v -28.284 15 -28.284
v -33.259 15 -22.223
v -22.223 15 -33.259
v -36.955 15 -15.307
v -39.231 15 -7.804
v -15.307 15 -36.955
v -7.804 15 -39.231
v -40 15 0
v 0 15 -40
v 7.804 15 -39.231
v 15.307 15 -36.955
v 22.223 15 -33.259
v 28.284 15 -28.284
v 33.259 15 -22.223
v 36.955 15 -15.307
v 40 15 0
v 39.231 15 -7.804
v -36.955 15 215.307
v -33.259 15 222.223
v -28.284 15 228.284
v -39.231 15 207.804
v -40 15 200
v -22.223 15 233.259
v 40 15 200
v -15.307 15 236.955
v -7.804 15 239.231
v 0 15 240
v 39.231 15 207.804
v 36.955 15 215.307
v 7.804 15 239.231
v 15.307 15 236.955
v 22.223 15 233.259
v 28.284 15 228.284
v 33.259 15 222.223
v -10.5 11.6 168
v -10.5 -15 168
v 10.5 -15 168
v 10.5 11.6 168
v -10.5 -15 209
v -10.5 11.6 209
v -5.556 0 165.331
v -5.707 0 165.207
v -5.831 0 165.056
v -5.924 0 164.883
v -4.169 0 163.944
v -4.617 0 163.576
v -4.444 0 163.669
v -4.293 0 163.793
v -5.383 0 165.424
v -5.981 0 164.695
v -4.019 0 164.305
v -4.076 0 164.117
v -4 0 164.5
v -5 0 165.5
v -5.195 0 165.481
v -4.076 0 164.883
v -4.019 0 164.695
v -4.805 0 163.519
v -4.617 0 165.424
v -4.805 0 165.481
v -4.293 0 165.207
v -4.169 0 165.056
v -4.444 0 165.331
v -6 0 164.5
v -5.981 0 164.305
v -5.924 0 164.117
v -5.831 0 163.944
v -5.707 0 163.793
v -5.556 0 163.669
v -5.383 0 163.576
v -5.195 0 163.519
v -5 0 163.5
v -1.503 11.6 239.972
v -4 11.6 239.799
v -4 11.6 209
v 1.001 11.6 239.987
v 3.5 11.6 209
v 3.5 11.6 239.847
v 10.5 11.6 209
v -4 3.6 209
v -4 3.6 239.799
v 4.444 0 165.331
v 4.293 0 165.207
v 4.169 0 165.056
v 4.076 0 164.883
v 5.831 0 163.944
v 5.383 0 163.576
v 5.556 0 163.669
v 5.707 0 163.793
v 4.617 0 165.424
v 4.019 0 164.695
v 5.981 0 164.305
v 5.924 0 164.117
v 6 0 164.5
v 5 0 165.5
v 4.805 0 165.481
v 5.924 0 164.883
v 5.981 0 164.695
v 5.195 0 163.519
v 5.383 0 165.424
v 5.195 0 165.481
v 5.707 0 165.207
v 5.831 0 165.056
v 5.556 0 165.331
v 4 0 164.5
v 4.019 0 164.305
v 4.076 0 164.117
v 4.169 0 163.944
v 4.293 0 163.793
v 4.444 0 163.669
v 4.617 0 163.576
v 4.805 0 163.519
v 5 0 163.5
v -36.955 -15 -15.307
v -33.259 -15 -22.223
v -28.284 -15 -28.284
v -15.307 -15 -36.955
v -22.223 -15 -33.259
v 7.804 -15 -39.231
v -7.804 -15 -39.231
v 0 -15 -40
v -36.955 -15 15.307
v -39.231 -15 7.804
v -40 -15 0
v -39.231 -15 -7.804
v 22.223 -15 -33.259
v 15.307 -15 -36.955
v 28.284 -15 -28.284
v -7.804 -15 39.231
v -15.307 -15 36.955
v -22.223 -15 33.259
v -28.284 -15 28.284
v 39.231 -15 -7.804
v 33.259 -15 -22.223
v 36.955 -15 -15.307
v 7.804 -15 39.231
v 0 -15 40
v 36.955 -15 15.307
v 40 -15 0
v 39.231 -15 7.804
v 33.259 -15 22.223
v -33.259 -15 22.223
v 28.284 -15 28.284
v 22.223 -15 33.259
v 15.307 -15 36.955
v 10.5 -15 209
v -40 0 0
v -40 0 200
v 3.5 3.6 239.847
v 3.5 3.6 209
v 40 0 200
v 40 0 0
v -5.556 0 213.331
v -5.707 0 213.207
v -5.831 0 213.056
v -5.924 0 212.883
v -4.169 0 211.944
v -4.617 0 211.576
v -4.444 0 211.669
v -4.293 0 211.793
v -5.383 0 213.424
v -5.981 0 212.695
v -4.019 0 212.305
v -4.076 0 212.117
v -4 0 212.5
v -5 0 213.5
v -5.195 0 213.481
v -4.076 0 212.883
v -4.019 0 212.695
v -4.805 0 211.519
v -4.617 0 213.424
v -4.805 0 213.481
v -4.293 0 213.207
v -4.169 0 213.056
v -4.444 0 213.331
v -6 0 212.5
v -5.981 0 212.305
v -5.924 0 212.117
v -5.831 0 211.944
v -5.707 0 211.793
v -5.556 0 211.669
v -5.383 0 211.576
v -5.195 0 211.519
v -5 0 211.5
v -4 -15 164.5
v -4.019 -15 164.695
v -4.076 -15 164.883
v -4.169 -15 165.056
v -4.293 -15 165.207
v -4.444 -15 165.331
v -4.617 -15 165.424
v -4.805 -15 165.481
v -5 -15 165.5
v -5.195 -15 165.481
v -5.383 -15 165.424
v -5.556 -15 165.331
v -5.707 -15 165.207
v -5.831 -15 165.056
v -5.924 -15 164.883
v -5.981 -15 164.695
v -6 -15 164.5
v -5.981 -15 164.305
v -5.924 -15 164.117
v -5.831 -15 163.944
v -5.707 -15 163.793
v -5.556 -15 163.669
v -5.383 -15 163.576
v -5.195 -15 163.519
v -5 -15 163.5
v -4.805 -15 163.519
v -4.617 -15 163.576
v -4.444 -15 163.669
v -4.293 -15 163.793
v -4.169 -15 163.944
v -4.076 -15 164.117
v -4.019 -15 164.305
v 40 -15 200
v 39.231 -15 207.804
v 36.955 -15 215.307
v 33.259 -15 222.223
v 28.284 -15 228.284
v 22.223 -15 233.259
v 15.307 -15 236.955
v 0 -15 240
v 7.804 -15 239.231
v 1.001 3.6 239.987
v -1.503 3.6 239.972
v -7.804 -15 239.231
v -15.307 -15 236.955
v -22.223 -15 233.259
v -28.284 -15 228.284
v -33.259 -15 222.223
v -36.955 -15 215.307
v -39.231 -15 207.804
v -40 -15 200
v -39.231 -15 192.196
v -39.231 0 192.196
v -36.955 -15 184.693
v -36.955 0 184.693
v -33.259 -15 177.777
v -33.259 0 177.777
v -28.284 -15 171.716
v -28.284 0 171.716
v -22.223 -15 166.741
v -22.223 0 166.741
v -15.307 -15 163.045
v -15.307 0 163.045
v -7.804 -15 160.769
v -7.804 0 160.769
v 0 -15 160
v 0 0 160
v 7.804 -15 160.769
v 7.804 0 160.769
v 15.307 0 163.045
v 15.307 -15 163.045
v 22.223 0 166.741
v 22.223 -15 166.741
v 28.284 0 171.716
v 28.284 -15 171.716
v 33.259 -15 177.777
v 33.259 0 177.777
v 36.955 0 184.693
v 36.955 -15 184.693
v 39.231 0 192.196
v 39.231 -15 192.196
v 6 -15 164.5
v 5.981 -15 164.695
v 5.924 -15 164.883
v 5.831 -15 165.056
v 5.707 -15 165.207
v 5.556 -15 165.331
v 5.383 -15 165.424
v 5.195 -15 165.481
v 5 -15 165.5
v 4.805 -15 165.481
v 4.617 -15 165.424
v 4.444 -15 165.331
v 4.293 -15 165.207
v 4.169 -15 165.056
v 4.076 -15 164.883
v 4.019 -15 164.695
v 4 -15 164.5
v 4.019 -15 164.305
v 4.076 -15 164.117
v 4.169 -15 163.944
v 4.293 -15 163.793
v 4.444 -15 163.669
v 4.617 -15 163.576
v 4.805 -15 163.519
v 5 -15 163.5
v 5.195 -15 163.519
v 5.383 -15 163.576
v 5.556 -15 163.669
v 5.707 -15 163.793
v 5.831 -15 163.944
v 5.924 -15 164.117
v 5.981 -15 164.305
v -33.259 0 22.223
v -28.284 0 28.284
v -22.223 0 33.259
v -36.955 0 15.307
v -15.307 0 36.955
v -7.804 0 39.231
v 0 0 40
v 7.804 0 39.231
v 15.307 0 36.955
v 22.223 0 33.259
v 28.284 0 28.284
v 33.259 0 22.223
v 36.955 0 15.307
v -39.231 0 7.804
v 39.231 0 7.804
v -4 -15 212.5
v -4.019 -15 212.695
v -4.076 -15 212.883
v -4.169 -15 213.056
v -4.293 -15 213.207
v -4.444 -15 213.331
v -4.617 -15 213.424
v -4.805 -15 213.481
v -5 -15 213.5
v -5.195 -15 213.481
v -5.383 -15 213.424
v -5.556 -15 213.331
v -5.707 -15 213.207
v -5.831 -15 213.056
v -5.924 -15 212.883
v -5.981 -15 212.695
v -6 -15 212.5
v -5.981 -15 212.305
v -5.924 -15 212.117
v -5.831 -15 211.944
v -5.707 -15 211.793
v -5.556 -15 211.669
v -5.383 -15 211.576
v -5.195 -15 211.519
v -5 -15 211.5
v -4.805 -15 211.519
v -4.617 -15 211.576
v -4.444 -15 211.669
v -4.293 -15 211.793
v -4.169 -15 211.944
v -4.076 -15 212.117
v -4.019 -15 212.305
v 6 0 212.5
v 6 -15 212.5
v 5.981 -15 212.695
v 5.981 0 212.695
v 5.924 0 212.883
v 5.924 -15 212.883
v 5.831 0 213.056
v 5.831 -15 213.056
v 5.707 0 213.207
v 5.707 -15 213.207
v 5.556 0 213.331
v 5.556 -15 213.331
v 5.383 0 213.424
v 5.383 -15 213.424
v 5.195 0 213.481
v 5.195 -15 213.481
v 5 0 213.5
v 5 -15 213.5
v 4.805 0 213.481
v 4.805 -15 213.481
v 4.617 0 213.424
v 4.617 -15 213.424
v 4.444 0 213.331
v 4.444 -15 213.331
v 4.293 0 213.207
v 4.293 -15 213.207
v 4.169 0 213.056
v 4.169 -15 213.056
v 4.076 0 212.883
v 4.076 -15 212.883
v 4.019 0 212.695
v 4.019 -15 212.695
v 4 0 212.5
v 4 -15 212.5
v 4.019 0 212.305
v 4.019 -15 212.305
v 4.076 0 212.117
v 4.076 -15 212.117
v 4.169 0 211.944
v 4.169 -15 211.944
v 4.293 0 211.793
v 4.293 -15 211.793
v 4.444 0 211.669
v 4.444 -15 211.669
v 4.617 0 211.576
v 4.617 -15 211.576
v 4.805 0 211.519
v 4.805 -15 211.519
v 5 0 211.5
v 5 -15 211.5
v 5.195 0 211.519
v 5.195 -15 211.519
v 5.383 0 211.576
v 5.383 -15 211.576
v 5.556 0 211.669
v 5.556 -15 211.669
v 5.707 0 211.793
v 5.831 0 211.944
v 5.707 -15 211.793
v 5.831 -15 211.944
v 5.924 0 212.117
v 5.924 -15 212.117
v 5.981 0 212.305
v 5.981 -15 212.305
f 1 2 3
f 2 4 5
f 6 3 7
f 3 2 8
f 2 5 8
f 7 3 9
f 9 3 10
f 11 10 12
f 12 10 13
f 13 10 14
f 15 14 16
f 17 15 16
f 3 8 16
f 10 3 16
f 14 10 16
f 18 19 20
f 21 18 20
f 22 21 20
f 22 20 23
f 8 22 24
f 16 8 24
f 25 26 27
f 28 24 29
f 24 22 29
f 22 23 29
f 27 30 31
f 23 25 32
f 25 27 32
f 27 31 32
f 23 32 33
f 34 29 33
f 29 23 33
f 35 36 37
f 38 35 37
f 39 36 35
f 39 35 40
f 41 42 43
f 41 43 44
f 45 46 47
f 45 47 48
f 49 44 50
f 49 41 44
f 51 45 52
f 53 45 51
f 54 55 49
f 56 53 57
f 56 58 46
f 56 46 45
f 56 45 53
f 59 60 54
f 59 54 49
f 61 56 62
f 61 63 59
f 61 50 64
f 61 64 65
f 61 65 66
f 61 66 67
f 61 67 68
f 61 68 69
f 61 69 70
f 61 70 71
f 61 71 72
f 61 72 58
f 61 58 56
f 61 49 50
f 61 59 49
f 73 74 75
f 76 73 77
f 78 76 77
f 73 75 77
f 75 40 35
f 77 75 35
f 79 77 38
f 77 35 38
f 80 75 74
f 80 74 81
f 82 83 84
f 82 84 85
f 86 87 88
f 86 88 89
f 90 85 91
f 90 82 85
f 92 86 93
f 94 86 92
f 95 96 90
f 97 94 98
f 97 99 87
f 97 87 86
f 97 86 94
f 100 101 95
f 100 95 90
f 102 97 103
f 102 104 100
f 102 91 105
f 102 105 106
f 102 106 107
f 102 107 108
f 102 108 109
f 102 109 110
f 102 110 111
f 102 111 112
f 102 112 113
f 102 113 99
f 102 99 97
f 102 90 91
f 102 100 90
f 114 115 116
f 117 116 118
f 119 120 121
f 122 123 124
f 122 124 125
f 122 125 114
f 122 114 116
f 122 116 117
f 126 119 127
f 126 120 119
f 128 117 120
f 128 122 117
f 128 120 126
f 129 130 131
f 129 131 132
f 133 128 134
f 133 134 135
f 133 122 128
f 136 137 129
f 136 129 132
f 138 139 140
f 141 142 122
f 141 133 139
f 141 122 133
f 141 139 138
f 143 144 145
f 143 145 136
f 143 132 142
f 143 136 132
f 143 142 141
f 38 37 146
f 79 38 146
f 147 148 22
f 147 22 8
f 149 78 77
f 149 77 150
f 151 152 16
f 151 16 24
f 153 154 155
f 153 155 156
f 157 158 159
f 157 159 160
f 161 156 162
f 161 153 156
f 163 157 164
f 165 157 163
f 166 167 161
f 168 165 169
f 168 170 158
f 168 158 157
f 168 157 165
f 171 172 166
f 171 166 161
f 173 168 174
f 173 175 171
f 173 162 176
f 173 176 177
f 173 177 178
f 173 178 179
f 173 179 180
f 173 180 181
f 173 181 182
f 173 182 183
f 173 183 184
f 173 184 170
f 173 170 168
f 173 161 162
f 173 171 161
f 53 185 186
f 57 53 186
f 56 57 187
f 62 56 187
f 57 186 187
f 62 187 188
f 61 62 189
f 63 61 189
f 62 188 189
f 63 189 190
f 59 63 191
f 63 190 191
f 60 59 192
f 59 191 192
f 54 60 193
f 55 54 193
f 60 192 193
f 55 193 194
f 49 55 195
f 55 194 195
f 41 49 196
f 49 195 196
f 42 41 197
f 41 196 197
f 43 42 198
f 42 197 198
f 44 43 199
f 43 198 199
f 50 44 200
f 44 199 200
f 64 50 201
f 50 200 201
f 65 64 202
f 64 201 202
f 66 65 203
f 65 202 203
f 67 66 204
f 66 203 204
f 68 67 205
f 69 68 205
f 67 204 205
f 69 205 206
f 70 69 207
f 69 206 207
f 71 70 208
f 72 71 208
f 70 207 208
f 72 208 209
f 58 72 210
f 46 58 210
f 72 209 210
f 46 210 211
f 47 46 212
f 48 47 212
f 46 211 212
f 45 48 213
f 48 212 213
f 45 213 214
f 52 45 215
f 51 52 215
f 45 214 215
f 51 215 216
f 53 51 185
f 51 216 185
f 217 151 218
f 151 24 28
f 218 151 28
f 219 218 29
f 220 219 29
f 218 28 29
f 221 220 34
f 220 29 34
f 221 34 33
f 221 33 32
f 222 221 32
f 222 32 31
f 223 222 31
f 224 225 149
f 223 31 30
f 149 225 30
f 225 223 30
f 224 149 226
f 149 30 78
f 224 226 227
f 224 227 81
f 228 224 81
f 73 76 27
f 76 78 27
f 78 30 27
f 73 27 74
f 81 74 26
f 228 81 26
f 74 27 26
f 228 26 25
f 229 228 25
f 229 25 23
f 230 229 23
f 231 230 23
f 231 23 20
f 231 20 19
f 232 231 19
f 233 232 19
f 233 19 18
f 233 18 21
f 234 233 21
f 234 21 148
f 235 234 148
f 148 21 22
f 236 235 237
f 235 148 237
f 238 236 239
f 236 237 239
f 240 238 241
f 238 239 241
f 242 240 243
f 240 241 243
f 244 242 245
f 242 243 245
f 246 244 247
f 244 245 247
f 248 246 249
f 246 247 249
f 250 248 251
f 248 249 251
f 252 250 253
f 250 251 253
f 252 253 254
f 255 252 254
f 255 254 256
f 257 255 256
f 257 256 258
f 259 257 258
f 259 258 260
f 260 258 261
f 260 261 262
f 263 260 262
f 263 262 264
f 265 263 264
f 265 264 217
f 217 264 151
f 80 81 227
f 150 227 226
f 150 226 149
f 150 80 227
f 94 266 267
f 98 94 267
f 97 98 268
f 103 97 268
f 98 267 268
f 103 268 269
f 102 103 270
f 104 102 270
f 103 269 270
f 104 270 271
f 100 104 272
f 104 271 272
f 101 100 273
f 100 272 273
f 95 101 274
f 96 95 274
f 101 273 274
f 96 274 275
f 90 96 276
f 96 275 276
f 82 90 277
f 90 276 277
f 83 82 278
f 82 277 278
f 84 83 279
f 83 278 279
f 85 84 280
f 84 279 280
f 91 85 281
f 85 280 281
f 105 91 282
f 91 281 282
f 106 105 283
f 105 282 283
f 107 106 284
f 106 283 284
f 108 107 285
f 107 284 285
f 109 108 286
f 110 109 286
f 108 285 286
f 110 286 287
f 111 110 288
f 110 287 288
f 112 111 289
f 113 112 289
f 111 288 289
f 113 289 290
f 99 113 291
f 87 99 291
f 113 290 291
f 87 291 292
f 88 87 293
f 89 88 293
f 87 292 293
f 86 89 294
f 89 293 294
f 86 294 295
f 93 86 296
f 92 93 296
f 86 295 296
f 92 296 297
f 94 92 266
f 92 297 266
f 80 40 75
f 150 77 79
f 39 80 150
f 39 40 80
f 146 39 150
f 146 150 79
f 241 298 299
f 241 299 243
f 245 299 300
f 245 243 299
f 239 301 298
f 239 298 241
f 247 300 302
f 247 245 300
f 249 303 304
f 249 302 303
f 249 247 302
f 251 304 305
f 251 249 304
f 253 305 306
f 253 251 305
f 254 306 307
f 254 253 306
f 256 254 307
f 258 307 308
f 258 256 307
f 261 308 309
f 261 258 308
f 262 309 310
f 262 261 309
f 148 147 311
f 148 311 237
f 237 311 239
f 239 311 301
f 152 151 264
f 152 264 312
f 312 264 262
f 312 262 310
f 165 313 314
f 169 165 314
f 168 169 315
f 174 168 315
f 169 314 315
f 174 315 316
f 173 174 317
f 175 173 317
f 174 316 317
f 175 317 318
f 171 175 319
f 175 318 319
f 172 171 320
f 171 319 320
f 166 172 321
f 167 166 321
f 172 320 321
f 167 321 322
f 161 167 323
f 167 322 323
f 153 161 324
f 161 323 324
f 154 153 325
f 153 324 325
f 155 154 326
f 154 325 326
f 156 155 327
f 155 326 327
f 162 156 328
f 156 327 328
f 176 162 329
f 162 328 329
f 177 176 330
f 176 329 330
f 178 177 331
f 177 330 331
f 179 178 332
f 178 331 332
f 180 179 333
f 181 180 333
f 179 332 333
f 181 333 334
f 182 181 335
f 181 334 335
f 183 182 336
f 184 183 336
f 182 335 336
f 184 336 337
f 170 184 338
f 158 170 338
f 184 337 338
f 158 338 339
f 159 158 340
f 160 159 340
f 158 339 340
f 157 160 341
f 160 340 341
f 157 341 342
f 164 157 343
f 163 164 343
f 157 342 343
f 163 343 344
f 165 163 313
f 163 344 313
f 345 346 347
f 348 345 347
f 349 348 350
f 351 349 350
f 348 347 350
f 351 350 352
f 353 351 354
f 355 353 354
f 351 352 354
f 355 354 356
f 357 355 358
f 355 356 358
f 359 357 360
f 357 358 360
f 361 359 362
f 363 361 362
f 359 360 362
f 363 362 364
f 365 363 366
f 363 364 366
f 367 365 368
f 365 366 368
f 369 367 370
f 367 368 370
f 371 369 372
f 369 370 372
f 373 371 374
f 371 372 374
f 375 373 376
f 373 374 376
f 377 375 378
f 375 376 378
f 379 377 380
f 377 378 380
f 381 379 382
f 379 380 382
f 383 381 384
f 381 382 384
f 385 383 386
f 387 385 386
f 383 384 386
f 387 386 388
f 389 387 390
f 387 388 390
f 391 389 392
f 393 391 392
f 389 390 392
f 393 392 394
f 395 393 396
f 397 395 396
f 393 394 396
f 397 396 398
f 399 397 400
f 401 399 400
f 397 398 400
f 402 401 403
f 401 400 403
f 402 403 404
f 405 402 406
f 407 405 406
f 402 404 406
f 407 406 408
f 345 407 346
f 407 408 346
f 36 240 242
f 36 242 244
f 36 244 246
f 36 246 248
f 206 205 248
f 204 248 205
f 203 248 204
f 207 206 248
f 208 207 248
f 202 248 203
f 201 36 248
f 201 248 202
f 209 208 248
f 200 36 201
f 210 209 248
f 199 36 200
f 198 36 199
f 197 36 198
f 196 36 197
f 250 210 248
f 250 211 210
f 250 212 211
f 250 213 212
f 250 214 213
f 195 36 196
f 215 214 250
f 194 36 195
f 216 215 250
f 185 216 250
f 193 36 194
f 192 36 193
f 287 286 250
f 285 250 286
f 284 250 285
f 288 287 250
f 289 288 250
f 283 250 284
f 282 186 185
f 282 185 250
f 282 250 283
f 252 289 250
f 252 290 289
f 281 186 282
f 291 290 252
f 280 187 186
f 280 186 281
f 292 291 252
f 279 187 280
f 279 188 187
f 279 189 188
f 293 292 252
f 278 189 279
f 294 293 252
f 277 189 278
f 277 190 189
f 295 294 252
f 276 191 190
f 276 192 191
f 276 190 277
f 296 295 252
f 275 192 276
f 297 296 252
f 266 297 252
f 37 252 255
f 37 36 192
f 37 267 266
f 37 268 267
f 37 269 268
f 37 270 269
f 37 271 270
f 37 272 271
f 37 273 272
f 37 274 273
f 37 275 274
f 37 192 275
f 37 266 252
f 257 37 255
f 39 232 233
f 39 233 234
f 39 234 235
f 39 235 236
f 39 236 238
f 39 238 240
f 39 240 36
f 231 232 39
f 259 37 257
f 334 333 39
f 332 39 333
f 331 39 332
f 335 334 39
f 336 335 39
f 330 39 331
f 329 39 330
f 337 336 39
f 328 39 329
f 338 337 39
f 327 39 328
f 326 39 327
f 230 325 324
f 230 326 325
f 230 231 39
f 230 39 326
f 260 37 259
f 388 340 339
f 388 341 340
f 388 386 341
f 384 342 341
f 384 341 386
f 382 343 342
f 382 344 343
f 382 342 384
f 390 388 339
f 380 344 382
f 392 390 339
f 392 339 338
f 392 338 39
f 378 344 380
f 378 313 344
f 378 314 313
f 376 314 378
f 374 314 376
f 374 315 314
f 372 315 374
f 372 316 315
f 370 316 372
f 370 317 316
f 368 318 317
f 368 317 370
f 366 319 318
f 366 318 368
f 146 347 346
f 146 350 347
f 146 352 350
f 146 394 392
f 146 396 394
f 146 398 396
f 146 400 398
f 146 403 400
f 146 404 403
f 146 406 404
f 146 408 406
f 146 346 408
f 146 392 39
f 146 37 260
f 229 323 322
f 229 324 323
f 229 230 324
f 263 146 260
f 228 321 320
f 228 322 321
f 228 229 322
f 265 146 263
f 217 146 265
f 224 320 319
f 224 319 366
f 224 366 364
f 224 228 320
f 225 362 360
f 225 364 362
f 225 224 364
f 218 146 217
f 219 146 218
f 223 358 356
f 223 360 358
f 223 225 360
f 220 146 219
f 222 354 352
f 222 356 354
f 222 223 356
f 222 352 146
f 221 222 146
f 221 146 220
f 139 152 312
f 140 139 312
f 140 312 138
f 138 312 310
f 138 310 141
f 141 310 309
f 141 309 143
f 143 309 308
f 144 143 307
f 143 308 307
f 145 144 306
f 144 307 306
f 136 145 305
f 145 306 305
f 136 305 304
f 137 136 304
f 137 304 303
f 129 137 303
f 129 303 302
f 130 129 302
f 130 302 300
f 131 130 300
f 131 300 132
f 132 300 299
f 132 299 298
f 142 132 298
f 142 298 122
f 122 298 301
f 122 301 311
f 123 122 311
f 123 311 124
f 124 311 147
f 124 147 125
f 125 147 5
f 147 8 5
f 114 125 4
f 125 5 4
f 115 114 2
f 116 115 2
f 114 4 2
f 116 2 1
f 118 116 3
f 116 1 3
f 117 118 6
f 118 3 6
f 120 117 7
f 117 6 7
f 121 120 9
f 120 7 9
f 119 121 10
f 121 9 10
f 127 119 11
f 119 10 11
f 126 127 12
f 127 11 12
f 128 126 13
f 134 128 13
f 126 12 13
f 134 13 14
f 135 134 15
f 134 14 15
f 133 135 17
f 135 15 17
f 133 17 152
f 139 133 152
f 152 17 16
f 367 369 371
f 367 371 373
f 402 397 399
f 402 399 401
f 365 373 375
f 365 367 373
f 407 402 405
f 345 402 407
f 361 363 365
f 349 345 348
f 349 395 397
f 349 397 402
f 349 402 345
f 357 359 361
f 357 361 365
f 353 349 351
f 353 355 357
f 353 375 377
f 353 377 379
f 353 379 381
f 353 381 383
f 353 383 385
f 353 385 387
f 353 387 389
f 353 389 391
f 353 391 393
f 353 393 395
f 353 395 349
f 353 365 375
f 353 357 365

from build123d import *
from build123d import SkipClean  # not in build123d's __all__

# Parameters (mm, degrees)
F1_DEPTH = 15
F2_DEPTH = 15
F3_DEPTH = 15
F4_W     = 21
F4_H     = 41
F5_DEPTH = 26.6
F6_R     = 1
F7_DEPTH = 15
F8_W     = 7.5
F8_H     = 8
F9_DEPTH = 31.001


# Not quite as in the source:
# - after a boolean that leaves OpenCascade's solid faulty, fix() repairs it


with BuildPart() as f1:
    # F0 (on Front) → F1 (new body)
    with BuildSketch(Plane.XZ):
        with BuildLine():
            ThreePointArc((-40, 0), (0, 40), (40, 0))
            Line((40, 0), (40, 200))
            ThreePointArc((40, 200), (0, 160), (-40, 200))
            Line((-40, 200), (-40, 0))
        make_face()
        with BuildLine():
            ThreePointArc((-40, 200), (0, 160), (40, 200))
            ThreePointArc((40, 200), (0, 240), (-40, 200))
        make_face()
        with BuildLine():
            ThreePointArc((-40, 0), (0, -40), (40, 0))
            ThreePointArc((40, 0), (0, 40), (-40, 0))
        make_face()
    extrude(amount=-F1_DEPTH)

    # F0 (on Front) → F2 (join)
    with BuildSketch(Plane.XZ):
        with BuildLine():
            ThreePointArc((-40, 200), (0, 160), (40, 200))
            ThreePointArc((40, 200), (0, 240), (-40, 200))
        make_face()
    with SkipClean():  # cleaning this boolean's faces spoils the solid; the shape is the same uncleaned
        extrude(amount=F2_DEPTH)

    # F0 (on Front) → F3 (join)
    with BuildSketch(Plane.XZ):
        with BuildLine():
            ThreePointArc((-40, 0), (0, -40), (40, 0))
            ThreePointArc((40, 0), (0, 40), (-40, 0))
        make_face()
    with SkipClean():  # cleaning this boolean's faces spoils the solid; the shape is the same uncleaned
        extrude(amount=F3_DEPTH)

    # F4 (on face) → F5 (cut)
    with BuildSketch(Plane.XZ.offset(15)):
        with Locations((0, 188.5)):
            Rectangle(F4_W, F4_H)
    extrude(amount=-F5_DEPTH, mode=Mode.SUBTRACT)

    add(f1.part.fix(), mode=Mode.REPLACE)

    # F6 (on face) → F7 (cut)
    with BuildSketch(Plane.XZ.offset(15)):
        with Locations((-5, 212.5)):
            Circle(F6_R)
        with Locations((5, 212.5)):
            Circle(F6_R)
        with Locations((5, 164.5)):
            Circle(F6_R)
        with Locations((-5, 164.5)):
            Circle(F6_R)
    extrude(amount=-F7_DEPTH, mode=Mode.SUBTRACT)

    # F8 (on face) → F9 (cut, through all)
    with BuildSketch(Plane(origin=(0, 0, 209), x_dir=(1, 0, 0), z_dir=(0, 0, -1))):
        with Locations((-0.25, -7.6)):
            Rectangle(F8_W, F8_H)
    extrude(amount=-F9_DEPTH, mode=Mode.SUBTRACT)


solid = f1.part
